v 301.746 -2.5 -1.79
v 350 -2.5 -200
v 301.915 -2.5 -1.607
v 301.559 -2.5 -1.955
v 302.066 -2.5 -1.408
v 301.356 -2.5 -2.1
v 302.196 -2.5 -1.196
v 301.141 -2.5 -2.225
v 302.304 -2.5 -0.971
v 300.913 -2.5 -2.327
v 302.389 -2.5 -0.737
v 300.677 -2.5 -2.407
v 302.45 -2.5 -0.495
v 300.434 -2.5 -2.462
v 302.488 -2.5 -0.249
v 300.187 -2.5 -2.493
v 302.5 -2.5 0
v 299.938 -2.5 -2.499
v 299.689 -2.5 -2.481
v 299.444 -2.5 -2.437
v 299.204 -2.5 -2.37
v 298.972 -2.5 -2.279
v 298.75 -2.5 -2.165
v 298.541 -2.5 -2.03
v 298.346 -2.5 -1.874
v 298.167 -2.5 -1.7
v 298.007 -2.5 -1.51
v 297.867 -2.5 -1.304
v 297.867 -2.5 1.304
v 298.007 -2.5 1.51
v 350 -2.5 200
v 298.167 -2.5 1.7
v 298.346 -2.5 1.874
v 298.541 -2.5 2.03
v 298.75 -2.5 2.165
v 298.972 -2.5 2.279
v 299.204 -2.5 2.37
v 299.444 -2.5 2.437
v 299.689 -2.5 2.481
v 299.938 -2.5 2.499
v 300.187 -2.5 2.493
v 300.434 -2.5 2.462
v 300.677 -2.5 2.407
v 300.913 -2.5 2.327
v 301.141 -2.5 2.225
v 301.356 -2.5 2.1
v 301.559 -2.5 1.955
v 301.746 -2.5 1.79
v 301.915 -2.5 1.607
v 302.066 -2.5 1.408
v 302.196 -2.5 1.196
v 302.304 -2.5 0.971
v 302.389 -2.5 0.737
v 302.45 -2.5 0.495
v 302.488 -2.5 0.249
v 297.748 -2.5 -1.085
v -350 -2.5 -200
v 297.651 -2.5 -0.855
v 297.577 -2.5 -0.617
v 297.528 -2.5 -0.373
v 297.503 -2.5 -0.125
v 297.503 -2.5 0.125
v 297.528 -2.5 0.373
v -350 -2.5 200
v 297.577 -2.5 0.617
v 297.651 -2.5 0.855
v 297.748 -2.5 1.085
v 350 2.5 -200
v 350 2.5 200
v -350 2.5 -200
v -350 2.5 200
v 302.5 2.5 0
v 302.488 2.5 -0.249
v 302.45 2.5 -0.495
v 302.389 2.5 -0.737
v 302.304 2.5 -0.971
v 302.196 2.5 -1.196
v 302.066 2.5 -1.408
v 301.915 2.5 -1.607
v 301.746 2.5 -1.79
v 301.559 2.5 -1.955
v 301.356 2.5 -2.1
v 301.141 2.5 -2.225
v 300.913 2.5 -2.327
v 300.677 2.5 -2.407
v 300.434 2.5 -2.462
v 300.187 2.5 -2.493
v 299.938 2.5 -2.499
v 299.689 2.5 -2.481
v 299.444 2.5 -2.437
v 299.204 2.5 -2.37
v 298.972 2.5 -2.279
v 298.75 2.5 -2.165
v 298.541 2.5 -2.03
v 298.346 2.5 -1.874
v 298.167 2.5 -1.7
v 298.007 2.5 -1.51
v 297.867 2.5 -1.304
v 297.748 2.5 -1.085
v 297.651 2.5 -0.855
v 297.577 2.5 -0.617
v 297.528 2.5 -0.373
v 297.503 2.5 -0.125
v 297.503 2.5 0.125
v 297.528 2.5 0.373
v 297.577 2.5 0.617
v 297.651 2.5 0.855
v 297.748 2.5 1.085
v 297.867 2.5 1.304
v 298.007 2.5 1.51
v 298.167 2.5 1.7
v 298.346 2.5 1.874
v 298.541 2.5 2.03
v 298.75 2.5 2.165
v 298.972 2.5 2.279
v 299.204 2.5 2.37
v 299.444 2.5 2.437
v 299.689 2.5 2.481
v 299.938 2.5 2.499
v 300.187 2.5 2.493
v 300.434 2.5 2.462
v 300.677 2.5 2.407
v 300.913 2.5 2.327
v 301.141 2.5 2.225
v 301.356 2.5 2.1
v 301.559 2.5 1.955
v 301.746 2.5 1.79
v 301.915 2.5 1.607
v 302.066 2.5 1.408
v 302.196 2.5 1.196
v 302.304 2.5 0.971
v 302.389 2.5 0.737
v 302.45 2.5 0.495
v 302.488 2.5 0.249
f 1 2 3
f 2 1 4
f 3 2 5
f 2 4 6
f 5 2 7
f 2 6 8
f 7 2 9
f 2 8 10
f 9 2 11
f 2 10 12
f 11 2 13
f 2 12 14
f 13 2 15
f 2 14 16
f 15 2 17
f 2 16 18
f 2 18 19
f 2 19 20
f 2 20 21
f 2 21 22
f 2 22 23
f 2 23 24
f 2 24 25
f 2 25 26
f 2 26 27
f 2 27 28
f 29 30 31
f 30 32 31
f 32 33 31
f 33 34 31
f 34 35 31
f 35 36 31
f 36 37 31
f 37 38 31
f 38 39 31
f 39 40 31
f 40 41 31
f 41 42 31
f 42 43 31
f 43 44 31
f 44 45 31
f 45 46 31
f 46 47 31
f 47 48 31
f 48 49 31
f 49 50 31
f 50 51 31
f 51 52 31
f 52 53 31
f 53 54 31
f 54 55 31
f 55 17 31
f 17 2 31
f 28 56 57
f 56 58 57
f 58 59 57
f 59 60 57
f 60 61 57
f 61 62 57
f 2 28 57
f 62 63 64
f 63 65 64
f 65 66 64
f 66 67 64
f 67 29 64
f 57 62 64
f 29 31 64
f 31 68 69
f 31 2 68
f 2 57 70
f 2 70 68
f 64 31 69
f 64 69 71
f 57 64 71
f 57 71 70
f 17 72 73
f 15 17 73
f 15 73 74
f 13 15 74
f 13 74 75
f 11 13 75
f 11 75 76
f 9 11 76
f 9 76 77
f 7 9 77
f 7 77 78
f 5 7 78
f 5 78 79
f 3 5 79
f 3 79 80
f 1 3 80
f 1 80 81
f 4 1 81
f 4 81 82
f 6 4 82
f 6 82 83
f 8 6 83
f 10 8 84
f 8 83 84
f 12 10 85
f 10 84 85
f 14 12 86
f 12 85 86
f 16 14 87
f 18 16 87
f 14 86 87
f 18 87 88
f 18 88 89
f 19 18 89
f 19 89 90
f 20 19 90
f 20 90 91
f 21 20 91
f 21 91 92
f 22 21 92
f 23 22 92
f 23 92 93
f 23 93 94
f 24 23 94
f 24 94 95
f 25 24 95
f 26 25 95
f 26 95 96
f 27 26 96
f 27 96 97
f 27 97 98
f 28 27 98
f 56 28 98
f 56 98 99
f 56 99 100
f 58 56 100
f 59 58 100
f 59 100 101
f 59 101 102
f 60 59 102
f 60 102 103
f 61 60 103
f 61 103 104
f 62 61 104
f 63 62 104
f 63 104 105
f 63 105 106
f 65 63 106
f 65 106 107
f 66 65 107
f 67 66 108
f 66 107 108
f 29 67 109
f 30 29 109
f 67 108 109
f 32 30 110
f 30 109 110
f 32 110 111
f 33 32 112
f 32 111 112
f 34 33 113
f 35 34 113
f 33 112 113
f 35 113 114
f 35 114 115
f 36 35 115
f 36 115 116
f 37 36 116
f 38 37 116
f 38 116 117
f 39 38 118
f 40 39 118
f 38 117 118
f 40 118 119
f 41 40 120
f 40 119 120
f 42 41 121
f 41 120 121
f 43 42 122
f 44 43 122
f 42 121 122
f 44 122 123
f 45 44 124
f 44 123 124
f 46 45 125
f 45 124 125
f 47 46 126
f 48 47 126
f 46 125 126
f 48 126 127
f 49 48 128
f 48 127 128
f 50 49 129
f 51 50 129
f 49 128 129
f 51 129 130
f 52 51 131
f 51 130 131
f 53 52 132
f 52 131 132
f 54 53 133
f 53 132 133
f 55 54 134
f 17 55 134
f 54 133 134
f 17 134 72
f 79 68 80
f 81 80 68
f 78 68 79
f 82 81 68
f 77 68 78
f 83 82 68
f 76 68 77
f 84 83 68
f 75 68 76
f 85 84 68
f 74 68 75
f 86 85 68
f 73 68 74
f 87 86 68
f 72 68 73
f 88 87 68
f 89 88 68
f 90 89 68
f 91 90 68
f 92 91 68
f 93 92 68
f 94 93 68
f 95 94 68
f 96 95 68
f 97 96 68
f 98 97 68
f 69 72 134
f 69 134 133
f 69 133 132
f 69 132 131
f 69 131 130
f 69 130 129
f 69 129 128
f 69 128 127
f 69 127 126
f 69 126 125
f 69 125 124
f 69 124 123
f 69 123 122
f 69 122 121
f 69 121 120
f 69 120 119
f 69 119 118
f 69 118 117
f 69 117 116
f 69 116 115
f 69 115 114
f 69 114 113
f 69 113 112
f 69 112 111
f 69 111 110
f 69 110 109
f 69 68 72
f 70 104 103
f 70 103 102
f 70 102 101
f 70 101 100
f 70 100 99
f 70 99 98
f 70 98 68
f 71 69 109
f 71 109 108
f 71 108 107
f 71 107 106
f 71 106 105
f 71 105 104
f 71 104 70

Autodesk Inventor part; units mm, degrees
ref_plane "YZ Plane" through (0, 0, 0) normal (1, 0, 0) x (0, 1, 0)
ref_plane "XZ Plane" through (0, 0, 0) normal (0, 1, 0) x (-1, 0, 0)
ref_plane "XY Plane" through (0, 0, 0) normal (0, 0, 1) x (1, 0, 0)
sketch "スケッチ1" plane through (0, 0, 0) normal (0, 1, 0) x (-1, 0, 0)
  line L0 (-350, 200) -> (350, 200)
  line L1 (350, 200) -> (350, -200)
  line L2 (350, -200) -> (-350, -200)
  line L3 (-350, -200) -> (-350, 200)
  line L4 (-350, 200) -> (350, -200) construction
  line L5 (350, 200) -> (-350, -200) construction
  point P0 (0, 0)
  dimension "d0" = 700
  dimension "d1" = 400
extrude "押し出し1" add sketch "スケッチ1" along normal mid plane 5
sketch "スケッチ2" plane through (0, 2.5, 0) normal (0, 1, 0) x (1, 0, 0)
  circle A0 centre (300, 0) radius 2.5
  line L0 (-490, 0) -> (490, 0) projected
  point P0 (0, 0)
  dimension "d4" = 300
  dimension "d5" = 5
extrude "押し出し2" cut sketch "スケッチ2" against normal through all
properties part number "endplate"
